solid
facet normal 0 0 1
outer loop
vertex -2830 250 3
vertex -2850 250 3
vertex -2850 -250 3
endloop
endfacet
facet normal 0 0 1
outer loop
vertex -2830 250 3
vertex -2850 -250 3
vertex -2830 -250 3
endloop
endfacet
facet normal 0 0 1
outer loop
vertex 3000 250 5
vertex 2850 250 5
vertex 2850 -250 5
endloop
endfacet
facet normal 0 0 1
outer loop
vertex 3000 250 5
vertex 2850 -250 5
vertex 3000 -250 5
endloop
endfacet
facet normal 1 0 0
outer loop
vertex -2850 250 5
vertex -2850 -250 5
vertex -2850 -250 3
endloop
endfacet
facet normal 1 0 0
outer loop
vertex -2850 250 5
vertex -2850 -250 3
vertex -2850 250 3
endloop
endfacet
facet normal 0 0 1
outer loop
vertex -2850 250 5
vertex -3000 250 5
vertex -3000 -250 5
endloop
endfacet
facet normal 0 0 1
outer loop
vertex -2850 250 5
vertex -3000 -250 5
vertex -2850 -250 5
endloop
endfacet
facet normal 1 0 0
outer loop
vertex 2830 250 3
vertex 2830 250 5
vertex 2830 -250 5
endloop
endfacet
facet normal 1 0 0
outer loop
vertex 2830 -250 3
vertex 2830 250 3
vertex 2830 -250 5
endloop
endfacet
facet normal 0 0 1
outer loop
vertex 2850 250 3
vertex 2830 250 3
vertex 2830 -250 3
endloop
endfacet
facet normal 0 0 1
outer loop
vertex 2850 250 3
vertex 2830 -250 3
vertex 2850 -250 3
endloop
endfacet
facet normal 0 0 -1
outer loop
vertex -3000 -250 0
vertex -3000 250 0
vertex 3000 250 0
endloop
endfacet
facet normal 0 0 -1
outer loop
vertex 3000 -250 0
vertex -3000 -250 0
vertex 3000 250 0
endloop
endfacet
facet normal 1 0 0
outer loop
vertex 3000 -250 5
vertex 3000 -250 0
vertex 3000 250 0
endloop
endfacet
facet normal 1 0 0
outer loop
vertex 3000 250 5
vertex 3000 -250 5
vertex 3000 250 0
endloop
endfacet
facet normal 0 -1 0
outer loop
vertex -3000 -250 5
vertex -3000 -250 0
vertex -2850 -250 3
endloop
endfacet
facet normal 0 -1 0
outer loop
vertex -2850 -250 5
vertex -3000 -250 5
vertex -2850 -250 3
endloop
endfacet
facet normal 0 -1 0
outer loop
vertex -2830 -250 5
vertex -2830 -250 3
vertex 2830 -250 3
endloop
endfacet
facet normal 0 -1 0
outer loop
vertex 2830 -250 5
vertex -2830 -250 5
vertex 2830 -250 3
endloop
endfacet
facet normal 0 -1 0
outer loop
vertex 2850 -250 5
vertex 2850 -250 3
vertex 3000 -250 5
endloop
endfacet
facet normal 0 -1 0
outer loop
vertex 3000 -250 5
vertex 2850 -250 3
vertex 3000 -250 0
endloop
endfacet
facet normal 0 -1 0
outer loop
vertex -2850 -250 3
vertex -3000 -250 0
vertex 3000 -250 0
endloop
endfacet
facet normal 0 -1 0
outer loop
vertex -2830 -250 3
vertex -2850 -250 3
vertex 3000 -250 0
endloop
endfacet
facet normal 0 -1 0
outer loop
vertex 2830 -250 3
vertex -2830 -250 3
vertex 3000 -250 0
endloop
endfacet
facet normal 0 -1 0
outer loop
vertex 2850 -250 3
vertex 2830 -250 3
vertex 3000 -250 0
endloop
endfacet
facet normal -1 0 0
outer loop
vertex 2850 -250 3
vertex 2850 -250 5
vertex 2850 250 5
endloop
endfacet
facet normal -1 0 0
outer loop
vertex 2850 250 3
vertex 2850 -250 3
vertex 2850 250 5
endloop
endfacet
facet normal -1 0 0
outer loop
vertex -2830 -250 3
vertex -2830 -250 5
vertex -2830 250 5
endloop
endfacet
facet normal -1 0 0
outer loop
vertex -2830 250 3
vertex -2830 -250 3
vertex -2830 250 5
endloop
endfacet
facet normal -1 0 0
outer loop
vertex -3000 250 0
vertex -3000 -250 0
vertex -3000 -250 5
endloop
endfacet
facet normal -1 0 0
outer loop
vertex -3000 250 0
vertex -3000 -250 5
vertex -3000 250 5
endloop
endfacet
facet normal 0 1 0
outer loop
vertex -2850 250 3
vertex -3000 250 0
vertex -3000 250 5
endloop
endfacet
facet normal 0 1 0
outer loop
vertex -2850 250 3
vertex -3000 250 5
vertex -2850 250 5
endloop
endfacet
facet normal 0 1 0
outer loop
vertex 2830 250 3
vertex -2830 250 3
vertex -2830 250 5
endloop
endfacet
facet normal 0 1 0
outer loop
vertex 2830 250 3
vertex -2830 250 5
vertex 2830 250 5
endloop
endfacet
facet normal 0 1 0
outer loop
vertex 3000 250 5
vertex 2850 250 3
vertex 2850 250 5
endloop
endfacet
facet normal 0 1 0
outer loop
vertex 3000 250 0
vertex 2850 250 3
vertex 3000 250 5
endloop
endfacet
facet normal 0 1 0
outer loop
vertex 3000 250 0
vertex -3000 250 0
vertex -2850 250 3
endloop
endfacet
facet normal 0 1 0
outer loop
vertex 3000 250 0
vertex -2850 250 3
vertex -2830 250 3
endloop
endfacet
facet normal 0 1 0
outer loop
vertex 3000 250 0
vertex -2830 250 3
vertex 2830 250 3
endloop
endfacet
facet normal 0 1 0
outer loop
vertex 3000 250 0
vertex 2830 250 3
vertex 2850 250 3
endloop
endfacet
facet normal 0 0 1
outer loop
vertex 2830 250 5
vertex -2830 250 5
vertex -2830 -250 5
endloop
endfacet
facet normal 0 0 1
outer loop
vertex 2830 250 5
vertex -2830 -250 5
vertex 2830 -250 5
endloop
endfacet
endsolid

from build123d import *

# Parameters (mm, degrees)
F0_W     = 6000
F0_H     = 500
F1_DEPTH = 5
F2_W     = 20
F2_H     = 500
F3_DEPTH = 2


with BuildPart() as f1:
    # F0 (on Top) → F1 (new body)
    with BuildSketch(Plane.XY):
        Rectangle(F0_W, F0_H)
    extrude(amount=F1_DEPTH)

    # F2 (on face) → F3 (cut)
    with BuildSketch(Plane.XY.offset(5)):
        with Locations((-2840, 0)):
            Rectangle(F2_W, F2_H)
        Polygon((2850, -250), (2850, 0), (2850, 250), (2830, 250), (2830, -250), align=None)
    extrude(amount=-F3_DEPTH, mode=Mode.SUBTRACT)


solid = f1.part
